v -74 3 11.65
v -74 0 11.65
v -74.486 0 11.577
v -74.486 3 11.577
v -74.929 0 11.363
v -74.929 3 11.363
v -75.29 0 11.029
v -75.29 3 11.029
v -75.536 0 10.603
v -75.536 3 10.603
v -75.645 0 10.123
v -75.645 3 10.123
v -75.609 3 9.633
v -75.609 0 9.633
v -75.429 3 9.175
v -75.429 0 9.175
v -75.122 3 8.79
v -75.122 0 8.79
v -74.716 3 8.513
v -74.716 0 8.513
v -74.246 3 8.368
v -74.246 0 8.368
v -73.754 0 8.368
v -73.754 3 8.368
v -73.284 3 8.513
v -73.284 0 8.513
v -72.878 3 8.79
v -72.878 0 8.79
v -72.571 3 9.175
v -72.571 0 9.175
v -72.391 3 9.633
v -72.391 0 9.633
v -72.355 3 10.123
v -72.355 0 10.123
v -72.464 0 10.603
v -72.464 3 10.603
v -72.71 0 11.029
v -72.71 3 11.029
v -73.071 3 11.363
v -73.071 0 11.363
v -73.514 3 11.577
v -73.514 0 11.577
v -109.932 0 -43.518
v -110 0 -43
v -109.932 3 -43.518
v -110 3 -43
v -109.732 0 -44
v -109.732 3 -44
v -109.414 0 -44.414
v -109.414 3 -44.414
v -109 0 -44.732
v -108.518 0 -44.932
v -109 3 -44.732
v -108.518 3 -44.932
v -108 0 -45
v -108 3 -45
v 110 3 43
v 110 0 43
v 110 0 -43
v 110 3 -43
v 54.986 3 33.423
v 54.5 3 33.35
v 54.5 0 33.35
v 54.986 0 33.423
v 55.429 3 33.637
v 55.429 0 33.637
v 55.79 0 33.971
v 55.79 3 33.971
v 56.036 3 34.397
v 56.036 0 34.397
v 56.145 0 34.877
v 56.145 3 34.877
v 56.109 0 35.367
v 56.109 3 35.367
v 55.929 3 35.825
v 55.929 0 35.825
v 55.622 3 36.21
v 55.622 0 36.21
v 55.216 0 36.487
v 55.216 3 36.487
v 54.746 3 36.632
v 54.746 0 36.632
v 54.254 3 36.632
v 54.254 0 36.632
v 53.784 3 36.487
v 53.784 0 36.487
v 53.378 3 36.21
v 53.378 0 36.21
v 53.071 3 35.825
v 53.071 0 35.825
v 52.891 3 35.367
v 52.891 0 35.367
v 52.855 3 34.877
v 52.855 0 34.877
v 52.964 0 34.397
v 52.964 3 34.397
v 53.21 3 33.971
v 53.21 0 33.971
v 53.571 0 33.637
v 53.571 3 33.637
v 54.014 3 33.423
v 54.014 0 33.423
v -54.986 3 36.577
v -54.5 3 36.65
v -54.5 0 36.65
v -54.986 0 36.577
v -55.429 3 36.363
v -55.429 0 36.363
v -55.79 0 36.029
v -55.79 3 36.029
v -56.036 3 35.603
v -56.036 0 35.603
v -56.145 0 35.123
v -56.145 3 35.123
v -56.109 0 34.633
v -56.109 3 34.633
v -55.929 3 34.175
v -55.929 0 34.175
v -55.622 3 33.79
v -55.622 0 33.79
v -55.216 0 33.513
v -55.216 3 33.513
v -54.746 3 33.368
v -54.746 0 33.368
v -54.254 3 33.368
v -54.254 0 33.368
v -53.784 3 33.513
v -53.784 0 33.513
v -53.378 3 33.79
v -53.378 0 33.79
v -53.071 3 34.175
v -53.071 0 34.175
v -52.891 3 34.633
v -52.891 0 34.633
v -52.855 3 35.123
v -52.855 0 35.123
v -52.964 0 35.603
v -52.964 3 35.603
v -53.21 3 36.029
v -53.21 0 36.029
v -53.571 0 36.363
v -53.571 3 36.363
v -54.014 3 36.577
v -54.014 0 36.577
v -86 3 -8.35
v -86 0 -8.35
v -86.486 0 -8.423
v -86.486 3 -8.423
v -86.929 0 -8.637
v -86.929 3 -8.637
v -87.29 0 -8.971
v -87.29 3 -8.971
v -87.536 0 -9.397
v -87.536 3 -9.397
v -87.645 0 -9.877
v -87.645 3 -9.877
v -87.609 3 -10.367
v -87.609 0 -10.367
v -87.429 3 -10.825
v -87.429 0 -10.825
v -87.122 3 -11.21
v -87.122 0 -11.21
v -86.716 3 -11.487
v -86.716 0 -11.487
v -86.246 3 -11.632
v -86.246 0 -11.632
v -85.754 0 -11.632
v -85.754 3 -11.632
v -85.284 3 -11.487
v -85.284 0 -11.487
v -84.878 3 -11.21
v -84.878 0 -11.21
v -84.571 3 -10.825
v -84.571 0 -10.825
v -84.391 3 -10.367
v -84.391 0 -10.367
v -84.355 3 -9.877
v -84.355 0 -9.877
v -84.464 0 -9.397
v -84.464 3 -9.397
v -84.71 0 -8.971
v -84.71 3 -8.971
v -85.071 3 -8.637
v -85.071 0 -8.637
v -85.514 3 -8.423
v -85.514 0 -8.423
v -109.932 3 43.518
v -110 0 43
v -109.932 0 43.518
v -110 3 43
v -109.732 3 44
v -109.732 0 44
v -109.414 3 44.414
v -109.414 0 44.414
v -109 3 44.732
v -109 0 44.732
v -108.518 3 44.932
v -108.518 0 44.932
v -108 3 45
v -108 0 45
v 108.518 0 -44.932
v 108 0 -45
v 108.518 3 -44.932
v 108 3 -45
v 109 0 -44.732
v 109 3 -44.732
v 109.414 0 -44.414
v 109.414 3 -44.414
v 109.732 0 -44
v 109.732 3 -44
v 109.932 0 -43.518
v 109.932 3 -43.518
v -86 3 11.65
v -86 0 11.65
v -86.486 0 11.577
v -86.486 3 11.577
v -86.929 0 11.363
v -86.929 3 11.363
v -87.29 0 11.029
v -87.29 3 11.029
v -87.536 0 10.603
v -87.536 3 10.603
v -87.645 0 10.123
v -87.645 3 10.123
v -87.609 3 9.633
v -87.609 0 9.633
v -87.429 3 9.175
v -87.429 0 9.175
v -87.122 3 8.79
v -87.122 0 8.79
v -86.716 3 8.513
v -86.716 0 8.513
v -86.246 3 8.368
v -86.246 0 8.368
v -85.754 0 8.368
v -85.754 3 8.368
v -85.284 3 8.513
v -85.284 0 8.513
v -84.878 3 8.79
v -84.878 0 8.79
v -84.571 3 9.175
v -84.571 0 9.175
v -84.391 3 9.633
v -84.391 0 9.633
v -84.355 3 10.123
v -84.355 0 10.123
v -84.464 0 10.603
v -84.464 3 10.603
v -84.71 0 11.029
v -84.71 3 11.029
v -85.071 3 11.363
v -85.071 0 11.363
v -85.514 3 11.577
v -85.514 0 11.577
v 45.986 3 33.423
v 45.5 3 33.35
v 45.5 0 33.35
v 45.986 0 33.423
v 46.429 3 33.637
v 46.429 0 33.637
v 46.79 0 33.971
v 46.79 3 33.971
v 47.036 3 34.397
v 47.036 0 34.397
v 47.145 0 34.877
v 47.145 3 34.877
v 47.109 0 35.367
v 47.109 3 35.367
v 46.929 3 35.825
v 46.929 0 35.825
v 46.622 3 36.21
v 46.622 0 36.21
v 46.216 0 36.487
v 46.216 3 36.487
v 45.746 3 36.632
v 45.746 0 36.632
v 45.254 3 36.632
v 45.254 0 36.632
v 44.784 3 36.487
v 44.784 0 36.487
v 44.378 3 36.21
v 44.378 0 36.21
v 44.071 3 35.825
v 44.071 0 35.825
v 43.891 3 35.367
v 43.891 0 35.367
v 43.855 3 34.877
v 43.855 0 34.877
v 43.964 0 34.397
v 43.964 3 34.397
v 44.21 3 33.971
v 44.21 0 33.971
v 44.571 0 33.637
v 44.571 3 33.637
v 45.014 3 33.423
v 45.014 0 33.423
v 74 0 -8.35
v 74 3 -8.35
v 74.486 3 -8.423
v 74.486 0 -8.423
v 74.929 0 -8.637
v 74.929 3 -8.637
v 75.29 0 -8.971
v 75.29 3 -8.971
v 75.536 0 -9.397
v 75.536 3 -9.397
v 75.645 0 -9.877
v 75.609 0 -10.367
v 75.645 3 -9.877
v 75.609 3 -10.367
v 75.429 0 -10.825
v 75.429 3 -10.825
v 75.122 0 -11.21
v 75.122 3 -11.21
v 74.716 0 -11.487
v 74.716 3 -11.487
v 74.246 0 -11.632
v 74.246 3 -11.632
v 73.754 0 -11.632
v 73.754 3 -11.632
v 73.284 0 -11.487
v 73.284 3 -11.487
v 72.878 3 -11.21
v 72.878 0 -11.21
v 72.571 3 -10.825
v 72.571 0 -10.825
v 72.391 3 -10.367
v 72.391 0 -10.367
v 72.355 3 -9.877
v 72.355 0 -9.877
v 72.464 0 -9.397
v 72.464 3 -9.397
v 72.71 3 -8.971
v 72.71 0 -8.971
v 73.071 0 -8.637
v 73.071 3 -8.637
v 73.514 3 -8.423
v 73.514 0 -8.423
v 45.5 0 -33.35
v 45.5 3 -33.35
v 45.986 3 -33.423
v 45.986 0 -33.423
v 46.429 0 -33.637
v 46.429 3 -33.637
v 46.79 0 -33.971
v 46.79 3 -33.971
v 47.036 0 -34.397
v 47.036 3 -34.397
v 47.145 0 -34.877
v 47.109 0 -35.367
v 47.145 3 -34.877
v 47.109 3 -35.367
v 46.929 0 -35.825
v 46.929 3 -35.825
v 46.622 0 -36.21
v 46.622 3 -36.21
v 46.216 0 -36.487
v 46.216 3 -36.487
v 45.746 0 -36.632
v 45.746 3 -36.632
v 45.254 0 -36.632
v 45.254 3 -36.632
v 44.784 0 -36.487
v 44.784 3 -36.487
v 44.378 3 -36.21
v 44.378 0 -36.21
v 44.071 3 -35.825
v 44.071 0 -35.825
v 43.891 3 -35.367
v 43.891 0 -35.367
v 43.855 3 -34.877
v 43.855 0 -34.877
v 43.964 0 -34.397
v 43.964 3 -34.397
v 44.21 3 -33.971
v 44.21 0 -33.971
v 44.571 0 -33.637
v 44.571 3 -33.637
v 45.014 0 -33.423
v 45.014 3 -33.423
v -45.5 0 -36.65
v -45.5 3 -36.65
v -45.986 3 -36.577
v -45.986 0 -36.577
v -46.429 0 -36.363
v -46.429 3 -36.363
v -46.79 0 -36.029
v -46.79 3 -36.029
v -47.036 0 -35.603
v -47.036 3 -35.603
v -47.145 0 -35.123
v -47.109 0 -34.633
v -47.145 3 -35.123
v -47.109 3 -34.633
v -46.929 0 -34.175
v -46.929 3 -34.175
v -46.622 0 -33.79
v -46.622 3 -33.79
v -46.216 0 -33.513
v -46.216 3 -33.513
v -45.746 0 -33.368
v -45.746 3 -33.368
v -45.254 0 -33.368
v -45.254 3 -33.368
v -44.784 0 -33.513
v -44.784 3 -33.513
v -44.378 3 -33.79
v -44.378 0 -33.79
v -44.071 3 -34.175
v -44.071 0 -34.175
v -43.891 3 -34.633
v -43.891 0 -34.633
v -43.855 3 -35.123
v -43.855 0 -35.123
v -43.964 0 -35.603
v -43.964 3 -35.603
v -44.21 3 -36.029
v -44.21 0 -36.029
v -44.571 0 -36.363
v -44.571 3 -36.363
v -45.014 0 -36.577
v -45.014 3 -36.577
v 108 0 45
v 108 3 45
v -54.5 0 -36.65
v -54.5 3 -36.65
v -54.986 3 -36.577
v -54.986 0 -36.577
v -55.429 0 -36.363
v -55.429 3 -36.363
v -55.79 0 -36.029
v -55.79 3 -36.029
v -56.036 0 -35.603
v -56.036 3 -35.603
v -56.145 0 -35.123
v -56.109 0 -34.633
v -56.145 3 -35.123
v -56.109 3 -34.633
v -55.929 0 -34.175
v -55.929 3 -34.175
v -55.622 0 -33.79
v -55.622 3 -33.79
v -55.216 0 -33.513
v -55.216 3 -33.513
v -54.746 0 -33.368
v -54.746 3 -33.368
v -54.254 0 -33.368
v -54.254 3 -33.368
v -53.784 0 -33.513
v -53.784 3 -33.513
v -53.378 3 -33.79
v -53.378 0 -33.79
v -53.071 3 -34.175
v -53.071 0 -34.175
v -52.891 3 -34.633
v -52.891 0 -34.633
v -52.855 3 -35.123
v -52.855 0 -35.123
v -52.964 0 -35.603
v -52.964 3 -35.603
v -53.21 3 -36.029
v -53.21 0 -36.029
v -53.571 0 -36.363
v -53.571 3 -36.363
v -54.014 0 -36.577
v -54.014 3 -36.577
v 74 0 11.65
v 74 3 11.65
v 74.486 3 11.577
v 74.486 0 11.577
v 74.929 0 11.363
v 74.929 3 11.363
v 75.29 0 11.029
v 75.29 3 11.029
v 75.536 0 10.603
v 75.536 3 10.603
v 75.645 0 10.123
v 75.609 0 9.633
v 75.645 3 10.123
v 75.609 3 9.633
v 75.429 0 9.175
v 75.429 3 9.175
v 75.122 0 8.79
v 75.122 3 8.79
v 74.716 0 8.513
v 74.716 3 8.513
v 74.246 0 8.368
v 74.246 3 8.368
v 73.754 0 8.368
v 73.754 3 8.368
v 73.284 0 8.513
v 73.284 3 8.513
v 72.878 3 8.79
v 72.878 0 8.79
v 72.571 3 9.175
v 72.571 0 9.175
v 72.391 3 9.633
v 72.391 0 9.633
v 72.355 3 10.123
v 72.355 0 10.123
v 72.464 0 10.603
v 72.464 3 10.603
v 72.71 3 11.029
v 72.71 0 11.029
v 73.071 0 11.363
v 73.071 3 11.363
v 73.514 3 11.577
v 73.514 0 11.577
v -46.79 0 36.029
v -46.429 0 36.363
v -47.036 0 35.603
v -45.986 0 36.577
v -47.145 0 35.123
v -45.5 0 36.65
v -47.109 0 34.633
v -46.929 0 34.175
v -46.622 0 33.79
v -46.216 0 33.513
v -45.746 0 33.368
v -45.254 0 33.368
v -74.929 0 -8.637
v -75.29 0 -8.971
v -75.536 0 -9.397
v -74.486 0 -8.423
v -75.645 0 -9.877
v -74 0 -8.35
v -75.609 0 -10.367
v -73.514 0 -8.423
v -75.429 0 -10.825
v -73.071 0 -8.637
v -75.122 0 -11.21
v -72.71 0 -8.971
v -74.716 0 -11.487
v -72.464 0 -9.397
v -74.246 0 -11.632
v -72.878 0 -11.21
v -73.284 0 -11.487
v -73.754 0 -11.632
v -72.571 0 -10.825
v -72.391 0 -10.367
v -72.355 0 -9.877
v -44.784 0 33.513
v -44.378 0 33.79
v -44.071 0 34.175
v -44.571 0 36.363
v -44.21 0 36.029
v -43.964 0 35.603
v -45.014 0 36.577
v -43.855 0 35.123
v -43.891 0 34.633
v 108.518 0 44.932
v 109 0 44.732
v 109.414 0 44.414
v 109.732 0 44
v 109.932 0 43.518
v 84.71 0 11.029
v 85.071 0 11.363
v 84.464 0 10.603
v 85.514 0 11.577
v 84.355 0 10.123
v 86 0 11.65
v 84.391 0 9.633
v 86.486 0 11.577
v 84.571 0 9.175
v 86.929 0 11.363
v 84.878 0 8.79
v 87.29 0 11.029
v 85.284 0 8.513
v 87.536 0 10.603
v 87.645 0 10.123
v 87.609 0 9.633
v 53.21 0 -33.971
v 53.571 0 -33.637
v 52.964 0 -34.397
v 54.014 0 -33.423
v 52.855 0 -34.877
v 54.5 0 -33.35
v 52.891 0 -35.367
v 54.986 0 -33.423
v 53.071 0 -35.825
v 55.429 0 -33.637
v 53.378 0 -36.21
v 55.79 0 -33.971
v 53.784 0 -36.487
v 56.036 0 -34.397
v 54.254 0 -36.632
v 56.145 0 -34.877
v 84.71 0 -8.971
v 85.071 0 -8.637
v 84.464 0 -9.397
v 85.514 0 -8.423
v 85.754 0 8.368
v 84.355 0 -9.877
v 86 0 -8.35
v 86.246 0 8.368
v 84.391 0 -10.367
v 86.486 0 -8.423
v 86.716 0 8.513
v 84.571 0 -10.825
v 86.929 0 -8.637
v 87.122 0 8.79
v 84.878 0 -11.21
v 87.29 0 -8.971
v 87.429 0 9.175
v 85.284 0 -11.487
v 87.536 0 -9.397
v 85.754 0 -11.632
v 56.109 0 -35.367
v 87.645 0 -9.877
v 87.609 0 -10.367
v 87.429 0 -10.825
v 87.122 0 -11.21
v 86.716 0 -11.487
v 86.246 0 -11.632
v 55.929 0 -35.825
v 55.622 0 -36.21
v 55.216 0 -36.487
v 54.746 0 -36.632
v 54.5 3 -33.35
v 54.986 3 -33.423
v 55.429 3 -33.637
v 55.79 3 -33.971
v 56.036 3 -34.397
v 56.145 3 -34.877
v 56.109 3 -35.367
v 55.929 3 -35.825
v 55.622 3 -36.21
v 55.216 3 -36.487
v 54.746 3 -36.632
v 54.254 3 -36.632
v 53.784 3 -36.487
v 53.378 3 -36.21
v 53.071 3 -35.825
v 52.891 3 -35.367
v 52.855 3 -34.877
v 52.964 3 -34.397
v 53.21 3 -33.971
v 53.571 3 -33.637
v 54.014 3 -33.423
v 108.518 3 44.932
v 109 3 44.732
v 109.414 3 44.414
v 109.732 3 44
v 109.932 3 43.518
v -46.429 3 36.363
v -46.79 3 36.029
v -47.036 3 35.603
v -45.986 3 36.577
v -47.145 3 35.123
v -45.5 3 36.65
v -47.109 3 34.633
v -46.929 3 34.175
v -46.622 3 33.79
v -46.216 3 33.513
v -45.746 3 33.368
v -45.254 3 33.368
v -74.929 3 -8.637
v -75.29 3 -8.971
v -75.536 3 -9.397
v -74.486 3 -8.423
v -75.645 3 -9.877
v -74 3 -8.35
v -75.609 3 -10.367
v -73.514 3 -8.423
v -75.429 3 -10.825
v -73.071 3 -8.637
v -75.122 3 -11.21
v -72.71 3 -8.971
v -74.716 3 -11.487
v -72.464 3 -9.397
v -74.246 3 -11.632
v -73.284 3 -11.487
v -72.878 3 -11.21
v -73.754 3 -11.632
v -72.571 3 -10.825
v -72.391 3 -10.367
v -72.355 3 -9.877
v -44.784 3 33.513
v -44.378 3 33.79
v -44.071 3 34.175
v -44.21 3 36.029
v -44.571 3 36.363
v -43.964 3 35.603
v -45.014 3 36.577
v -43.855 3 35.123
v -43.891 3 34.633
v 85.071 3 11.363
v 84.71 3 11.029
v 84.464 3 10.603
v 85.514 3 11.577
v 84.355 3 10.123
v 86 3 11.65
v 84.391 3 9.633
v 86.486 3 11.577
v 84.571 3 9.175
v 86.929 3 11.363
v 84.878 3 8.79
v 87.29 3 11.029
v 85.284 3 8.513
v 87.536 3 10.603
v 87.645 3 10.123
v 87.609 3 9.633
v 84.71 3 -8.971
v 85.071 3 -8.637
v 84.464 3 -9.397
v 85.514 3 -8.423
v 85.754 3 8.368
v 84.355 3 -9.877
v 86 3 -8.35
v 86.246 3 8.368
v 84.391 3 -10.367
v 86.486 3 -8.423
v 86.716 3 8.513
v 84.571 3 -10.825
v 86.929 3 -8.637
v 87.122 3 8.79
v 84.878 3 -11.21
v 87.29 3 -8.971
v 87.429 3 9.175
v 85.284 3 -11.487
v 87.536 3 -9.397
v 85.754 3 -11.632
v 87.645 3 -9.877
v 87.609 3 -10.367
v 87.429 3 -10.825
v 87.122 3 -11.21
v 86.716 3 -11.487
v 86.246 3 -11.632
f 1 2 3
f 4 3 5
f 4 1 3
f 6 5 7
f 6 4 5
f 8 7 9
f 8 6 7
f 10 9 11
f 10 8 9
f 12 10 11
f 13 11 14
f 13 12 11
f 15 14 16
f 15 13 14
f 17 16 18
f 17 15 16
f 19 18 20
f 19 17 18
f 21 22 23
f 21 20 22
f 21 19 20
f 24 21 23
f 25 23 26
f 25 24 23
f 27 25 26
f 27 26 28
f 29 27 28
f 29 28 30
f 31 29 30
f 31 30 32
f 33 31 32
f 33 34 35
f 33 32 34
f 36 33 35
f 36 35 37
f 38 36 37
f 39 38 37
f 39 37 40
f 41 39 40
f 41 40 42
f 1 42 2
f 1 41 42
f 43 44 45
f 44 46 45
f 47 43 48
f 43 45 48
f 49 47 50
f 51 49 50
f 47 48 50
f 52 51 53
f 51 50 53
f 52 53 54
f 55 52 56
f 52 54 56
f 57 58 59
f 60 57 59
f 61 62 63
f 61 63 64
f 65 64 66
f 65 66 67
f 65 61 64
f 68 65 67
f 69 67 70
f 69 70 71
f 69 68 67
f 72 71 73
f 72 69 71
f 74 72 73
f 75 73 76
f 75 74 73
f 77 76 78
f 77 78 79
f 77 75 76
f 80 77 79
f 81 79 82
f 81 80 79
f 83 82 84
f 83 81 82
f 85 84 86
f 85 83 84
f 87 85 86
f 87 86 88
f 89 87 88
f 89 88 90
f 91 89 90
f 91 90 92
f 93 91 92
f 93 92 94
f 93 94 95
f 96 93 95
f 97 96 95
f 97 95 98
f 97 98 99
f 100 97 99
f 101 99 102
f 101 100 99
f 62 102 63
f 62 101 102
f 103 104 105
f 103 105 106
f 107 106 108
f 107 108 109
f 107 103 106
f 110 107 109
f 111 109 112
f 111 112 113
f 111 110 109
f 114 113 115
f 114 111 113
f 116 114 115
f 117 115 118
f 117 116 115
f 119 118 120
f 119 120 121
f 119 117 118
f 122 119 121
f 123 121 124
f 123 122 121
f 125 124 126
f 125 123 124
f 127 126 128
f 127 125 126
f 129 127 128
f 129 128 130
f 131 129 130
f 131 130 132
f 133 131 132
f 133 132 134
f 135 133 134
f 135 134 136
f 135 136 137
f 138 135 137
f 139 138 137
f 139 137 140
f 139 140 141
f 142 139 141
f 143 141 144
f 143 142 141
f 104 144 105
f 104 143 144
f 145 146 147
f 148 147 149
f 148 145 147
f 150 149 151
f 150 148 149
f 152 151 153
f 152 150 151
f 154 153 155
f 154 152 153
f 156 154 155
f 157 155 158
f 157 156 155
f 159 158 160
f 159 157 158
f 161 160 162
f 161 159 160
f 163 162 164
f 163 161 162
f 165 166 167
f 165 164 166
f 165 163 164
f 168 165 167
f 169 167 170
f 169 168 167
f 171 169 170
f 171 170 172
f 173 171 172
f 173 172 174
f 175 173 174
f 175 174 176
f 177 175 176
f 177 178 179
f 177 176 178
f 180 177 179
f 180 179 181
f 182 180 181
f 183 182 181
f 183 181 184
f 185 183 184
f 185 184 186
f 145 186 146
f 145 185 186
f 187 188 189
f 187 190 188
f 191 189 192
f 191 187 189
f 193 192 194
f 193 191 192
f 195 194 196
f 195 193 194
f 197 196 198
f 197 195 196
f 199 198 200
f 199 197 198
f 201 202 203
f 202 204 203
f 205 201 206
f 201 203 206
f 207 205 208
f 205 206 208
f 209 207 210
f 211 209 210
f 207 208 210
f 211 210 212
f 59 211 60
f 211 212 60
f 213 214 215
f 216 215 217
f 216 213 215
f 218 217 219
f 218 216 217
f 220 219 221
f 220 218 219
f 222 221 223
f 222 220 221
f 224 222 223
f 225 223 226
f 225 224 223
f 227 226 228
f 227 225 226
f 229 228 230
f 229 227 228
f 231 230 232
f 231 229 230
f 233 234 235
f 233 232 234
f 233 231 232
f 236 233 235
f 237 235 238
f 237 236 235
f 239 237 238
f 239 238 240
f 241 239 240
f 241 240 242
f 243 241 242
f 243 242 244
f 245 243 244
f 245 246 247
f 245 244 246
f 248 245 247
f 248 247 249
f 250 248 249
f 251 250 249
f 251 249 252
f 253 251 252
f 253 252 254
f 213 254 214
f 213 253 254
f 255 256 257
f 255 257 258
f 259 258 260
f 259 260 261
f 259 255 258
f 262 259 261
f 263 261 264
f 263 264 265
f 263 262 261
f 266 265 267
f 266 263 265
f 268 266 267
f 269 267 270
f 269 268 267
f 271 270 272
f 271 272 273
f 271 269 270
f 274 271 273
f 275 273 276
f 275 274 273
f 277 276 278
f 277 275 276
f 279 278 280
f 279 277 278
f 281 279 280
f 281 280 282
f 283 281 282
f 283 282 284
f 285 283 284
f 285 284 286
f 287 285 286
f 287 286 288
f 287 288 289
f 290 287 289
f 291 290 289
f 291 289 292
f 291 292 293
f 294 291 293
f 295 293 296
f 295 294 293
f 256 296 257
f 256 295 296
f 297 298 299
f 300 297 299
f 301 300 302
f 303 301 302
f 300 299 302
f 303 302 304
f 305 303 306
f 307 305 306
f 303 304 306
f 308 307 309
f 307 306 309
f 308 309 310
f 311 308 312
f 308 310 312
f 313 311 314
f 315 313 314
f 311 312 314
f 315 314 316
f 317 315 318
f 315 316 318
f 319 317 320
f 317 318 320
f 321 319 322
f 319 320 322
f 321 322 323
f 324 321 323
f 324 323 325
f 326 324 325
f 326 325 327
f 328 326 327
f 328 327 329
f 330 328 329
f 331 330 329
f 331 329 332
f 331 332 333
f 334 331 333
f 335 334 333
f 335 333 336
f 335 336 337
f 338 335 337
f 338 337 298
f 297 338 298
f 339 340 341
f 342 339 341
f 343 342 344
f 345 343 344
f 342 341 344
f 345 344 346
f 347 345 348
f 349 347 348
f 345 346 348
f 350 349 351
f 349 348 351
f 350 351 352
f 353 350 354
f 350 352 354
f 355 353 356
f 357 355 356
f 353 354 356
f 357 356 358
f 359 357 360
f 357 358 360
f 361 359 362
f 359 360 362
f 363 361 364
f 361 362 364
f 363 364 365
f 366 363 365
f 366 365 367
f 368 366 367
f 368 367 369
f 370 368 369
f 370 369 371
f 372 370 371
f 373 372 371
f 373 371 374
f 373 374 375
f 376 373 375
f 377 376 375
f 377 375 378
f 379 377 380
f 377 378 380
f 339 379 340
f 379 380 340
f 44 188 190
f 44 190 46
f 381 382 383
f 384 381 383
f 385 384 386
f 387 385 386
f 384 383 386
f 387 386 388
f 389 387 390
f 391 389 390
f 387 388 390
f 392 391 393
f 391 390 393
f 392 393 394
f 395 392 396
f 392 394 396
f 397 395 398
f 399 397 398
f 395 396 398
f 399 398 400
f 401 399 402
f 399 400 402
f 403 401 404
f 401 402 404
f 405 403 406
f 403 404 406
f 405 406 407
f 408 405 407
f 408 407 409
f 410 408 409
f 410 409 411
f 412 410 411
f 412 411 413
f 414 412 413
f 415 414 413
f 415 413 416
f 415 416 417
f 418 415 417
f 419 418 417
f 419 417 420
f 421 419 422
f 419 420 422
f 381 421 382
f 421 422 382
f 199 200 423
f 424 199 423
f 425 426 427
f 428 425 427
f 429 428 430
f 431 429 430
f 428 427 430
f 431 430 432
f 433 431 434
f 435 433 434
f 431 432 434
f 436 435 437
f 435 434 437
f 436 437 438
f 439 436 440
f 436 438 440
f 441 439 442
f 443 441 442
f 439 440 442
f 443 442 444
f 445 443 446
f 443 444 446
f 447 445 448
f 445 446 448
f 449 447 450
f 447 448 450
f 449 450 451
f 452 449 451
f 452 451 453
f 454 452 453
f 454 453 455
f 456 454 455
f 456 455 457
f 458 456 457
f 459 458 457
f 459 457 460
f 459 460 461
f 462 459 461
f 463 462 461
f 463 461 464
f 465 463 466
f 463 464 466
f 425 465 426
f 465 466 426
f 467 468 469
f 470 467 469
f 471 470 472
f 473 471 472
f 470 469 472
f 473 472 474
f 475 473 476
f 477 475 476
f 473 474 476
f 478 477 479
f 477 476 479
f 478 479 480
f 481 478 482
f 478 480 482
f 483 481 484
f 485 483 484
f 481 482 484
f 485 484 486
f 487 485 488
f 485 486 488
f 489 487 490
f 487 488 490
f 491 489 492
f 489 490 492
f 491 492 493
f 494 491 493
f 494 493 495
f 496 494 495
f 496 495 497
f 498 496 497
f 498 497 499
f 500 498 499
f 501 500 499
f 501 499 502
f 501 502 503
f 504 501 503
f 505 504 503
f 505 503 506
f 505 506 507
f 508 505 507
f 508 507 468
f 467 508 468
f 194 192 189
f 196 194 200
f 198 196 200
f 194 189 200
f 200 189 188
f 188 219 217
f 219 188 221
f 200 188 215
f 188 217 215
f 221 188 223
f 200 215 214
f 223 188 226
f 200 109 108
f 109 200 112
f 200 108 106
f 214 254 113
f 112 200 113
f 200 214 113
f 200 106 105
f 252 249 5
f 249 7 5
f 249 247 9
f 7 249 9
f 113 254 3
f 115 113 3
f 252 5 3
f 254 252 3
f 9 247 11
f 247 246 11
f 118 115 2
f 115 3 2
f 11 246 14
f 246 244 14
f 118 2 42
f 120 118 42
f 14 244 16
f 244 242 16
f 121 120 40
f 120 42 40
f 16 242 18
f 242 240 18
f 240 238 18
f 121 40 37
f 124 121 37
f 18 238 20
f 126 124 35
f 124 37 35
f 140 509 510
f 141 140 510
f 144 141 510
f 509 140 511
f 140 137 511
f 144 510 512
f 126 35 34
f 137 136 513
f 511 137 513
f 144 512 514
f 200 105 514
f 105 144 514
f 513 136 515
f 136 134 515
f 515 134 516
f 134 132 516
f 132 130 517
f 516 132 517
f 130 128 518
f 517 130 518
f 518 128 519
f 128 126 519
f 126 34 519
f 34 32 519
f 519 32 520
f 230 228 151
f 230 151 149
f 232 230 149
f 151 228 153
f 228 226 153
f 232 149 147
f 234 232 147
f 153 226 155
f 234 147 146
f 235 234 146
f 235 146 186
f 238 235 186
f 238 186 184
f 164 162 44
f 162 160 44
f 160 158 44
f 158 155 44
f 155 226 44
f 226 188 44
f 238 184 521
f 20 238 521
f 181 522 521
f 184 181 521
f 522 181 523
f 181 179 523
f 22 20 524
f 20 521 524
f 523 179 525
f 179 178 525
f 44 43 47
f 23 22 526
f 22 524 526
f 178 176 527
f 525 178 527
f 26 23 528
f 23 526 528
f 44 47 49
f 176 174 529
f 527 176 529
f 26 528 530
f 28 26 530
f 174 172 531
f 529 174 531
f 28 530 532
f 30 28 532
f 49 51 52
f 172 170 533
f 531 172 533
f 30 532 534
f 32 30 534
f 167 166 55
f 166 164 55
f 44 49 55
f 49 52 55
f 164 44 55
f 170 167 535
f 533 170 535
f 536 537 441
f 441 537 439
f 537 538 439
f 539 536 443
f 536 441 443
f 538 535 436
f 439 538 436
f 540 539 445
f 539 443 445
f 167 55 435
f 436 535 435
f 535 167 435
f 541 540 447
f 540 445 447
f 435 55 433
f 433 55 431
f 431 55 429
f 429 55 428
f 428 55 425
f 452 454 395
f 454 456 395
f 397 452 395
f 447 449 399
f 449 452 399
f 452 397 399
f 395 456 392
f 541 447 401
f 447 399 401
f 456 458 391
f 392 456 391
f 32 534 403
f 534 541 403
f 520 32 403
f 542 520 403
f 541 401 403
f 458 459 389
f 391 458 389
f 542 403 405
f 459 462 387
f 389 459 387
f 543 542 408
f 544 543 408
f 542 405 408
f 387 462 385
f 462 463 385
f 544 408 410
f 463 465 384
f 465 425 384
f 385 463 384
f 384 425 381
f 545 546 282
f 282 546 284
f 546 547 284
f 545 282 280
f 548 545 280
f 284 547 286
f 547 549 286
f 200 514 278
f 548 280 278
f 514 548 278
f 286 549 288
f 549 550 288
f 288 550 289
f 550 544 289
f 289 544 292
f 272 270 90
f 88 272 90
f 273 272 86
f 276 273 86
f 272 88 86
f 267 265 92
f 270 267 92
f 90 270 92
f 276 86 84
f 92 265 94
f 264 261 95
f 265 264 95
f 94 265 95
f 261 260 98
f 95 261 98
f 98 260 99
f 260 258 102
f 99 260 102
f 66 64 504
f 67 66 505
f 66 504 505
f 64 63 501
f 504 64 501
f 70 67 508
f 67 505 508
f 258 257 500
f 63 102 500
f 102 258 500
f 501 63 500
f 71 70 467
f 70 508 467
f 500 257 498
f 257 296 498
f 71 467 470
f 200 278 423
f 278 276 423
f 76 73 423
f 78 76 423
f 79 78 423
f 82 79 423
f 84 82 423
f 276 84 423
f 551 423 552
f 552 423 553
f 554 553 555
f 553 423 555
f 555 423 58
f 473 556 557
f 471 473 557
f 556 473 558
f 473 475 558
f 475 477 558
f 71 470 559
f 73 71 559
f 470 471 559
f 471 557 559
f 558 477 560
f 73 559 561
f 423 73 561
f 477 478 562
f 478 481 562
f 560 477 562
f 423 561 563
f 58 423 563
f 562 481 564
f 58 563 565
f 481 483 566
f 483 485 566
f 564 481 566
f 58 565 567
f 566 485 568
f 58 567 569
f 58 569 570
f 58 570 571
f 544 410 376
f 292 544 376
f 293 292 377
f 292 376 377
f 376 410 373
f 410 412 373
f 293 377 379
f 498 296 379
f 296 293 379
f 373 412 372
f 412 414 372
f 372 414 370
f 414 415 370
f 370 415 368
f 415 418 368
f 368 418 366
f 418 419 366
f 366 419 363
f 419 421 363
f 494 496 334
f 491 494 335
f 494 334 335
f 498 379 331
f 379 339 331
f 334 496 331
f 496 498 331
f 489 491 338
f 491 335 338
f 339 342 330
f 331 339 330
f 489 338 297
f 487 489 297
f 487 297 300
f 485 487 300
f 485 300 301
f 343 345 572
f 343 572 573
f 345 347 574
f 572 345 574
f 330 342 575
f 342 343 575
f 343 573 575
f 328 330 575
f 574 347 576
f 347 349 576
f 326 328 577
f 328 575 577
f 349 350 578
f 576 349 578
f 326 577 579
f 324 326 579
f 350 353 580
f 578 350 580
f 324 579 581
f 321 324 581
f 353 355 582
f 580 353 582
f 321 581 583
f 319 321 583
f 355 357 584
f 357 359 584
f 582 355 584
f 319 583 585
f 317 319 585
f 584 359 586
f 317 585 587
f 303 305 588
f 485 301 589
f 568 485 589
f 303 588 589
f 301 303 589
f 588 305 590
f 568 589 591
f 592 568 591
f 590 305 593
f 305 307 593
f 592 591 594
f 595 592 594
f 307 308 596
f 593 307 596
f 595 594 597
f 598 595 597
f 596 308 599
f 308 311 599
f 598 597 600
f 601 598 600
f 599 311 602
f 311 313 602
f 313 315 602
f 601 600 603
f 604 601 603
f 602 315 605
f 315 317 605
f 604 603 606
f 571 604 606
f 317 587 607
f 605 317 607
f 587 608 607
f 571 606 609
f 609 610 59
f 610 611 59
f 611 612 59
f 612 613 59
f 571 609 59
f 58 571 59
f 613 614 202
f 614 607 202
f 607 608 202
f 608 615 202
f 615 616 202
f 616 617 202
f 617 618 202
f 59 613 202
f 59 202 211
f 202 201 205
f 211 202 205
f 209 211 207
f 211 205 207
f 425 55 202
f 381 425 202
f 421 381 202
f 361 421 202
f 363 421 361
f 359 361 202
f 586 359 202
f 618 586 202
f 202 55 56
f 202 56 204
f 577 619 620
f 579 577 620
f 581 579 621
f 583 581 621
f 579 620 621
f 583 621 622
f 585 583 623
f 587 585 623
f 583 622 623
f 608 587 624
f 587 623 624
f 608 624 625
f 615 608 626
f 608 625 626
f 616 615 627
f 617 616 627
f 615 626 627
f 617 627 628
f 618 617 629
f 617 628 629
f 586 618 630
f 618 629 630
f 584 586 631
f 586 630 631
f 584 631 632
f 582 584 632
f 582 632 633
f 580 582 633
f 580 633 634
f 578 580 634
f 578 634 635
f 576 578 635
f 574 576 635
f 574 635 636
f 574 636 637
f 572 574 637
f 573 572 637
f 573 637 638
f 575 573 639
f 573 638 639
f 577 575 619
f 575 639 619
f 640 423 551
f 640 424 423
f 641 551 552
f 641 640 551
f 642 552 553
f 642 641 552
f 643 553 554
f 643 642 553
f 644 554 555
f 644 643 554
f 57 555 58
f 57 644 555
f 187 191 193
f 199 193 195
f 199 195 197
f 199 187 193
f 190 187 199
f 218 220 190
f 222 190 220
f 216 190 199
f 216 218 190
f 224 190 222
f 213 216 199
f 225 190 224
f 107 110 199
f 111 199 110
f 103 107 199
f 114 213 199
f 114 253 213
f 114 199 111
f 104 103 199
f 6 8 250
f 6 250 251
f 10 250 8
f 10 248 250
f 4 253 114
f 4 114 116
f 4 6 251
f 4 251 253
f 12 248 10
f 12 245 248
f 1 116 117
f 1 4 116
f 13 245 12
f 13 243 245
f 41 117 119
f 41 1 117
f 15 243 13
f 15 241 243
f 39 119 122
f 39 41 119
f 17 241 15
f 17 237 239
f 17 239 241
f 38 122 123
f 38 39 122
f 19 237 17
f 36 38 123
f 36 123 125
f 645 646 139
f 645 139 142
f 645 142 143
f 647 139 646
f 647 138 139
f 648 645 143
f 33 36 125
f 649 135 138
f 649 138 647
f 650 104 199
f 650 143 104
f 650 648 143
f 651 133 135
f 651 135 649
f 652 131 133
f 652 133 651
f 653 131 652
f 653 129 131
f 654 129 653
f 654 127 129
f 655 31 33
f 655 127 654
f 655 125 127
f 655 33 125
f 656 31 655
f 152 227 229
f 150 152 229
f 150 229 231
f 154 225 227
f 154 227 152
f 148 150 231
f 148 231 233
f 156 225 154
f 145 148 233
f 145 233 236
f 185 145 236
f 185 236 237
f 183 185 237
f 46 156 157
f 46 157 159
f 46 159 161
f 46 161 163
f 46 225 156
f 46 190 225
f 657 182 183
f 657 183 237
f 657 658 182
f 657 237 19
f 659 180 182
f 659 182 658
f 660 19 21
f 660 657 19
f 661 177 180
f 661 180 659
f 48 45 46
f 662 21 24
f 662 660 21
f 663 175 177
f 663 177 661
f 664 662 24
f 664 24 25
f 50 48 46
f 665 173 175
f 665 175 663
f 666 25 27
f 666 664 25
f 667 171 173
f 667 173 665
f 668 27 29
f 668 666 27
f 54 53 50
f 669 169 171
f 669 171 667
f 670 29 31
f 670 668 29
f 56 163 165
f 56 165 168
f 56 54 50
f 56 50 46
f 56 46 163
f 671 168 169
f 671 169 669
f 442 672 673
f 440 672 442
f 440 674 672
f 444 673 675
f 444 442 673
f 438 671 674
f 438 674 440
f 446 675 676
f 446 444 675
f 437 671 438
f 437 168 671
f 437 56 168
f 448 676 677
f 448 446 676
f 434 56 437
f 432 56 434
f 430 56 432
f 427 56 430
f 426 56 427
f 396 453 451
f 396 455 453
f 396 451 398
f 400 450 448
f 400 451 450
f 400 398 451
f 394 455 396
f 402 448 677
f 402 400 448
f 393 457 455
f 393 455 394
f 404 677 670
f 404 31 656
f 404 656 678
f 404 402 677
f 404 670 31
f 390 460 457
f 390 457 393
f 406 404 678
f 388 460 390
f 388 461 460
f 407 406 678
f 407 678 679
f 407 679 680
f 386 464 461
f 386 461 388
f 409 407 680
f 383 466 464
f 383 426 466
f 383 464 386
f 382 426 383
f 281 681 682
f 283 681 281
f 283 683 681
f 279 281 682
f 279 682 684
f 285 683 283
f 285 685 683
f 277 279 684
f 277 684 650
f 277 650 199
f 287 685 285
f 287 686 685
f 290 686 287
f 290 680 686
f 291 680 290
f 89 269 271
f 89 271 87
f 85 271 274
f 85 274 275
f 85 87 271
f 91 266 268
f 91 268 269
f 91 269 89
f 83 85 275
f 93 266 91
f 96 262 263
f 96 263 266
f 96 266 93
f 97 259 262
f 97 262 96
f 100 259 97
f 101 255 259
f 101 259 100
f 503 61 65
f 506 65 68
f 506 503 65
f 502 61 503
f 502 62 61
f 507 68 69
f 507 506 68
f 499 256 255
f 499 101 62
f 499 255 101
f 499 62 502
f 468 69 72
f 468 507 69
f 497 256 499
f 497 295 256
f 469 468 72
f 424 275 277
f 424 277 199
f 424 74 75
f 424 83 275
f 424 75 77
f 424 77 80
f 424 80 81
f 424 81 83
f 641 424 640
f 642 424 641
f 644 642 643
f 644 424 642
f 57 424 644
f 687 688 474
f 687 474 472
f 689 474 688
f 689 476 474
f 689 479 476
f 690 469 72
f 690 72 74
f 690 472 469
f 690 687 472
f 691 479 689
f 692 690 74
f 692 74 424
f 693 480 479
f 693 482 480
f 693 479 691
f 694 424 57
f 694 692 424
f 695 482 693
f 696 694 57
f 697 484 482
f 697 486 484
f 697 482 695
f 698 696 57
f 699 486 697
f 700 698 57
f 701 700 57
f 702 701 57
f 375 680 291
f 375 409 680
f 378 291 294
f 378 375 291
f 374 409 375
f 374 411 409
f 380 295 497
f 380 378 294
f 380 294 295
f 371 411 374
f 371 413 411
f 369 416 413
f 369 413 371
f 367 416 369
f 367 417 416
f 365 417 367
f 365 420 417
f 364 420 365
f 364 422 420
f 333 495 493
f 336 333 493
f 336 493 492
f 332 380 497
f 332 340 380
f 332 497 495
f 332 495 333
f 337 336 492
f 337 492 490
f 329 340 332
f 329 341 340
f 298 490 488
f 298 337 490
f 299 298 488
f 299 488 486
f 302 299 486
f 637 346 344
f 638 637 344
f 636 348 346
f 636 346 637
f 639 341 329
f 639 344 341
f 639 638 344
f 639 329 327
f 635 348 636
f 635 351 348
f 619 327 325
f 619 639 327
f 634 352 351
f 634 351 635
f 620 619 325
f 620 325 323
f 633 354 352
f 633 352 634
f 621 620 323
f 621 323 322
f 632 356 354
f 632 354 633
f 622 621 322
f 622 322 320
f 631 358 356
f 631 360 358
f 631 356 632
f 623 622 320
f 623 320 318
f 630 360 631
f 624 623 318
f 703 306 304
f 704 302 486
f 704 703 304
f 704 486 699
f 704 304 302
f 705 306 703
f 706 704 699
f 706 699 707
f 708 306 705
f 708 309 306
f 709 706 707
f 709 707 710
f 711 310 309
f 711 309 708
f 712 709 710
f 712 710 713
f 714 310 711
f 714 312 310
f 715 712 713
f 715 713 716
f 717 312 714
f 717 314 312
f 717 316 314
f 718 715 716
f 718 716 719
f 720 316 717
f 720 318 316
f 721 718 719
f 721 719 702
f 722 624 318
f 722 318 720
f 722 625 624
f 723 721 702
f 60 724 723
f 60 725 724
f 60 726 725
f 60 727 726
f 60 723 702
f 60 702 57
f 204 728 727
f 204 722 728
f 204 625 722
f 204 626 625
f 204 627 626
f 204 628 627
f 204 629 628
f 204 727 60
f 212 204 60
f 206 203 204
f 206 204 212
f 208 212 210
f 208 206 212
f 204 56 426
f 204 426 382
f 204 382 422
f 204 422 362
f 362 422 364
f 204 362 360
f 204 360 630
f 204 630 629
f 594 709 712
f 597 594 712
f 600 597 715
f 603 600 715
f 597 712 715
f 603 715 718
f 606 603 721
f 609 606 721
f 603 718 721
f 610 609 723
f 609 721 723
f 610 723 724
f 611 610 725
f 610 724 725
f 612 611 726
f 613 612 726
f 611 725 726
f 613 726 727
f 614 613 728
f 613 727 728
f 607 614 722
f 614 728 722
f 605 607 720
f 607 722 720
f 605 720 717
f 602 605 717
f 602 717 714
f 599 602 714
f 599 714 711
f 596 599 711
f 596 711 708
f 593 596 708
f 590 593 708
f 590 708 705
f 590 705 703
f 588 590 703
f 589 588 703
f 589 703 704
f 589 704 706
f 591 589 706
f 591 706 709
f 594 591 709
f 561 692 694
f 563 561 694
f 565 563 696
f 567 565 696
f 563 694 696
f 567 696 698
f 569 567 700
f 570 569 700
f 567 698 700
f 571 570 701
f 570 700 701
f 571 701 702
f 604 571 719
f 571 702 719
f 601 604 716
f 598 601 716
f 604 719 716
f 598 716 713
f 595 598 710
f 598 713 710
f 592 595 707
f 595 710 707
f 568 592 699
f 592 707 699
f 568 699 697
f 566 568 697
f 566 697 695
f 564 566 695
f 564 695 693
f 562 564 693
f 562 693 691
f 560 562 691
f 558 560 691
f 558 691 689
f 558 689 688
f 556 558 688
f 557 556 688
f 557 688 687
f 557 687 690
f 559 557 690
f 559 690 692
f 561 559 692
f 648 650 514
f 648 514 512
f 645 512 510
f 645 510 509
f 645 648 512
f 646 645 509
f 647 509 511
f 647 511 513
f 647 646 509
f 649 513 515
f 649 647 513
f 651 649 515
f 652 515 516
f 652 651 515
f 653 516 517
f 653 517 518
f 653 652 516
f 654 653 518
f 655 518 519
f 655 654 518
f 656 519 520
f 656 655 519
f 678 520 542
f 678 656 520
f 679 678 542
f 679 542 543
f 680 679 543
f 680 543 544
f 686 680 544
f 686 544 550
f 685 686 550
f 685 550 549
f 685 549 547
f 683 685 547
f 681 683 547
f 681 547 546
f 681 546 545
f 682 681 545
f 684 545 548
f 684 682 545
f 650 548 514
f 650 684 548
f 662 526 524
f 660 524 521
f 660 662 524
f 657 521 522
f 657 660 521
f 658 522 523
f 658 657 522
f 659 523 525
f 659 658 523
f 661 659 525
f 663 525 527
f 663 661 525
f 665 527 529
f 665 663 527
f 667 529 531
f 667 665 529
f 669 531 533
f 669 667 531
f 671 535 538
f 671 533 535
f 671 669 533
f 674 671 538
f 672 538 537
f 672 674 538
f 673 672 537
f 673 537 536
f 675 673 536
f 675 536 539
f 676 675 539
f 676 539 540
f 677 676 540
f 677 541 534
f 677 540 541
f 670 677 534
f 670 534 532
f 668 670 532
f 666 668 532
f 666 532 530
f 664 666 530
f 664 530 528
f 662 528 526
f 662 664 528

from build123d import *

# Parameters (mm, degrees)
SKETCH_1_W          = 220
SKETCH_1_H          = 90
EXTRUDE_1_DEPTH     = 3
SKETCH_4_R          = 1.65
CUT_EXTRUDE_2_DEPTH = 3
FILLET_1_R          = 2
SKETCH_5_R          = 1.65
CUT_EXTRUDE_3_DEPTH = 10


with BuildPart() as part:
    # 草图1 → 凸台-拉伸1 (new body)
    with BuildSketch(Plane(origin=(0, 0, 0), x_dir=(1, 0, 0), z_dir=(0, 1, 0))):
        Rectangle(SKETCH_1_W, SKETCH_1_H)
    extrude(amount=EXTRUDE_1_DEPTH)

    # 草图4 → 切除-拉伸2 (cut)
    with BuildSketch(Plane(origin=(0, 3, 0), x_dir=(1, 0, 0), z_dir=(0, 1, 0))):
        with Locations(Location((54.5, 35, 0), (0, 0, 270))):
            Circle(SKETCH_4_R)
        with Locations(Location((45.5, 35, 0), (0, 0, 270))):
            Circle(SKETCH_4_R)
        with Locations(Location((-54.5, 35, 0), (0, 0, 90))):
            Circle(SKETCH_4_R)
        with Locations(Location((-45.5, 35, 0), (0, 0, 90))):
            Circle(SKETCH_4_R)
    cut_extrude_2 = extrude(amount=-CUT_EXTRUDE_2_DEPTH, mode=Mode.SUBTRACT)

    # 镜向1: 切除-拉伸2 across plane
    add(cut_extrude_2.mirror(Plane.XY), mode=Mode.SUBTRACT)

    # 圆角1
    fillet_1_edges = [part.edges().sort_by_distance(p)[0] for p in [
        (110, 1.5, 45),
        (-110, 1.5, 45),
        (-110, 1.5, -45),
        (110, 1.5, -45),
    ]]
    fillet(fillet_1_edges, radius=FILLET_1_R)

    # 草图5 → 切除-拉伸3 (cut)
    with BuildSketch(Plane(origin=(0, 3, 0), x_dir=(1, 0, 0), z_dir=(0, 1, 0))):
        with Locations(Location((86, 10, 0), (0, 0, 270))):
            Circle(SKETCH_5_R)
        with Locations(Location((74, 10, 0), (0, 0, 270))):
            Circle(SKETCH_5_R)
        with Locations(Location((74, -10, 0), (0, 0, 270))):
            Circle(SKETCH_5_R)
        with Locations(Location((86, -10, 0), (0, 0, 270))):
            Circle(SKETCH_5_R)
    cut_extrude_3 = extrude(amount=-CUT_EXTRUDE_3_DEPTH, mode=Mode.SUBTRACT)

    # 镜向3: 切除-拉伸3 across plane
    add(cut_extrude_3.mirror(Plane(origin=(0, 0, 0), x_dir=(0, 0, 1), z_dir=(1, 0, 0))), mode=Mode.SUBTRACT)


solid = part.part
